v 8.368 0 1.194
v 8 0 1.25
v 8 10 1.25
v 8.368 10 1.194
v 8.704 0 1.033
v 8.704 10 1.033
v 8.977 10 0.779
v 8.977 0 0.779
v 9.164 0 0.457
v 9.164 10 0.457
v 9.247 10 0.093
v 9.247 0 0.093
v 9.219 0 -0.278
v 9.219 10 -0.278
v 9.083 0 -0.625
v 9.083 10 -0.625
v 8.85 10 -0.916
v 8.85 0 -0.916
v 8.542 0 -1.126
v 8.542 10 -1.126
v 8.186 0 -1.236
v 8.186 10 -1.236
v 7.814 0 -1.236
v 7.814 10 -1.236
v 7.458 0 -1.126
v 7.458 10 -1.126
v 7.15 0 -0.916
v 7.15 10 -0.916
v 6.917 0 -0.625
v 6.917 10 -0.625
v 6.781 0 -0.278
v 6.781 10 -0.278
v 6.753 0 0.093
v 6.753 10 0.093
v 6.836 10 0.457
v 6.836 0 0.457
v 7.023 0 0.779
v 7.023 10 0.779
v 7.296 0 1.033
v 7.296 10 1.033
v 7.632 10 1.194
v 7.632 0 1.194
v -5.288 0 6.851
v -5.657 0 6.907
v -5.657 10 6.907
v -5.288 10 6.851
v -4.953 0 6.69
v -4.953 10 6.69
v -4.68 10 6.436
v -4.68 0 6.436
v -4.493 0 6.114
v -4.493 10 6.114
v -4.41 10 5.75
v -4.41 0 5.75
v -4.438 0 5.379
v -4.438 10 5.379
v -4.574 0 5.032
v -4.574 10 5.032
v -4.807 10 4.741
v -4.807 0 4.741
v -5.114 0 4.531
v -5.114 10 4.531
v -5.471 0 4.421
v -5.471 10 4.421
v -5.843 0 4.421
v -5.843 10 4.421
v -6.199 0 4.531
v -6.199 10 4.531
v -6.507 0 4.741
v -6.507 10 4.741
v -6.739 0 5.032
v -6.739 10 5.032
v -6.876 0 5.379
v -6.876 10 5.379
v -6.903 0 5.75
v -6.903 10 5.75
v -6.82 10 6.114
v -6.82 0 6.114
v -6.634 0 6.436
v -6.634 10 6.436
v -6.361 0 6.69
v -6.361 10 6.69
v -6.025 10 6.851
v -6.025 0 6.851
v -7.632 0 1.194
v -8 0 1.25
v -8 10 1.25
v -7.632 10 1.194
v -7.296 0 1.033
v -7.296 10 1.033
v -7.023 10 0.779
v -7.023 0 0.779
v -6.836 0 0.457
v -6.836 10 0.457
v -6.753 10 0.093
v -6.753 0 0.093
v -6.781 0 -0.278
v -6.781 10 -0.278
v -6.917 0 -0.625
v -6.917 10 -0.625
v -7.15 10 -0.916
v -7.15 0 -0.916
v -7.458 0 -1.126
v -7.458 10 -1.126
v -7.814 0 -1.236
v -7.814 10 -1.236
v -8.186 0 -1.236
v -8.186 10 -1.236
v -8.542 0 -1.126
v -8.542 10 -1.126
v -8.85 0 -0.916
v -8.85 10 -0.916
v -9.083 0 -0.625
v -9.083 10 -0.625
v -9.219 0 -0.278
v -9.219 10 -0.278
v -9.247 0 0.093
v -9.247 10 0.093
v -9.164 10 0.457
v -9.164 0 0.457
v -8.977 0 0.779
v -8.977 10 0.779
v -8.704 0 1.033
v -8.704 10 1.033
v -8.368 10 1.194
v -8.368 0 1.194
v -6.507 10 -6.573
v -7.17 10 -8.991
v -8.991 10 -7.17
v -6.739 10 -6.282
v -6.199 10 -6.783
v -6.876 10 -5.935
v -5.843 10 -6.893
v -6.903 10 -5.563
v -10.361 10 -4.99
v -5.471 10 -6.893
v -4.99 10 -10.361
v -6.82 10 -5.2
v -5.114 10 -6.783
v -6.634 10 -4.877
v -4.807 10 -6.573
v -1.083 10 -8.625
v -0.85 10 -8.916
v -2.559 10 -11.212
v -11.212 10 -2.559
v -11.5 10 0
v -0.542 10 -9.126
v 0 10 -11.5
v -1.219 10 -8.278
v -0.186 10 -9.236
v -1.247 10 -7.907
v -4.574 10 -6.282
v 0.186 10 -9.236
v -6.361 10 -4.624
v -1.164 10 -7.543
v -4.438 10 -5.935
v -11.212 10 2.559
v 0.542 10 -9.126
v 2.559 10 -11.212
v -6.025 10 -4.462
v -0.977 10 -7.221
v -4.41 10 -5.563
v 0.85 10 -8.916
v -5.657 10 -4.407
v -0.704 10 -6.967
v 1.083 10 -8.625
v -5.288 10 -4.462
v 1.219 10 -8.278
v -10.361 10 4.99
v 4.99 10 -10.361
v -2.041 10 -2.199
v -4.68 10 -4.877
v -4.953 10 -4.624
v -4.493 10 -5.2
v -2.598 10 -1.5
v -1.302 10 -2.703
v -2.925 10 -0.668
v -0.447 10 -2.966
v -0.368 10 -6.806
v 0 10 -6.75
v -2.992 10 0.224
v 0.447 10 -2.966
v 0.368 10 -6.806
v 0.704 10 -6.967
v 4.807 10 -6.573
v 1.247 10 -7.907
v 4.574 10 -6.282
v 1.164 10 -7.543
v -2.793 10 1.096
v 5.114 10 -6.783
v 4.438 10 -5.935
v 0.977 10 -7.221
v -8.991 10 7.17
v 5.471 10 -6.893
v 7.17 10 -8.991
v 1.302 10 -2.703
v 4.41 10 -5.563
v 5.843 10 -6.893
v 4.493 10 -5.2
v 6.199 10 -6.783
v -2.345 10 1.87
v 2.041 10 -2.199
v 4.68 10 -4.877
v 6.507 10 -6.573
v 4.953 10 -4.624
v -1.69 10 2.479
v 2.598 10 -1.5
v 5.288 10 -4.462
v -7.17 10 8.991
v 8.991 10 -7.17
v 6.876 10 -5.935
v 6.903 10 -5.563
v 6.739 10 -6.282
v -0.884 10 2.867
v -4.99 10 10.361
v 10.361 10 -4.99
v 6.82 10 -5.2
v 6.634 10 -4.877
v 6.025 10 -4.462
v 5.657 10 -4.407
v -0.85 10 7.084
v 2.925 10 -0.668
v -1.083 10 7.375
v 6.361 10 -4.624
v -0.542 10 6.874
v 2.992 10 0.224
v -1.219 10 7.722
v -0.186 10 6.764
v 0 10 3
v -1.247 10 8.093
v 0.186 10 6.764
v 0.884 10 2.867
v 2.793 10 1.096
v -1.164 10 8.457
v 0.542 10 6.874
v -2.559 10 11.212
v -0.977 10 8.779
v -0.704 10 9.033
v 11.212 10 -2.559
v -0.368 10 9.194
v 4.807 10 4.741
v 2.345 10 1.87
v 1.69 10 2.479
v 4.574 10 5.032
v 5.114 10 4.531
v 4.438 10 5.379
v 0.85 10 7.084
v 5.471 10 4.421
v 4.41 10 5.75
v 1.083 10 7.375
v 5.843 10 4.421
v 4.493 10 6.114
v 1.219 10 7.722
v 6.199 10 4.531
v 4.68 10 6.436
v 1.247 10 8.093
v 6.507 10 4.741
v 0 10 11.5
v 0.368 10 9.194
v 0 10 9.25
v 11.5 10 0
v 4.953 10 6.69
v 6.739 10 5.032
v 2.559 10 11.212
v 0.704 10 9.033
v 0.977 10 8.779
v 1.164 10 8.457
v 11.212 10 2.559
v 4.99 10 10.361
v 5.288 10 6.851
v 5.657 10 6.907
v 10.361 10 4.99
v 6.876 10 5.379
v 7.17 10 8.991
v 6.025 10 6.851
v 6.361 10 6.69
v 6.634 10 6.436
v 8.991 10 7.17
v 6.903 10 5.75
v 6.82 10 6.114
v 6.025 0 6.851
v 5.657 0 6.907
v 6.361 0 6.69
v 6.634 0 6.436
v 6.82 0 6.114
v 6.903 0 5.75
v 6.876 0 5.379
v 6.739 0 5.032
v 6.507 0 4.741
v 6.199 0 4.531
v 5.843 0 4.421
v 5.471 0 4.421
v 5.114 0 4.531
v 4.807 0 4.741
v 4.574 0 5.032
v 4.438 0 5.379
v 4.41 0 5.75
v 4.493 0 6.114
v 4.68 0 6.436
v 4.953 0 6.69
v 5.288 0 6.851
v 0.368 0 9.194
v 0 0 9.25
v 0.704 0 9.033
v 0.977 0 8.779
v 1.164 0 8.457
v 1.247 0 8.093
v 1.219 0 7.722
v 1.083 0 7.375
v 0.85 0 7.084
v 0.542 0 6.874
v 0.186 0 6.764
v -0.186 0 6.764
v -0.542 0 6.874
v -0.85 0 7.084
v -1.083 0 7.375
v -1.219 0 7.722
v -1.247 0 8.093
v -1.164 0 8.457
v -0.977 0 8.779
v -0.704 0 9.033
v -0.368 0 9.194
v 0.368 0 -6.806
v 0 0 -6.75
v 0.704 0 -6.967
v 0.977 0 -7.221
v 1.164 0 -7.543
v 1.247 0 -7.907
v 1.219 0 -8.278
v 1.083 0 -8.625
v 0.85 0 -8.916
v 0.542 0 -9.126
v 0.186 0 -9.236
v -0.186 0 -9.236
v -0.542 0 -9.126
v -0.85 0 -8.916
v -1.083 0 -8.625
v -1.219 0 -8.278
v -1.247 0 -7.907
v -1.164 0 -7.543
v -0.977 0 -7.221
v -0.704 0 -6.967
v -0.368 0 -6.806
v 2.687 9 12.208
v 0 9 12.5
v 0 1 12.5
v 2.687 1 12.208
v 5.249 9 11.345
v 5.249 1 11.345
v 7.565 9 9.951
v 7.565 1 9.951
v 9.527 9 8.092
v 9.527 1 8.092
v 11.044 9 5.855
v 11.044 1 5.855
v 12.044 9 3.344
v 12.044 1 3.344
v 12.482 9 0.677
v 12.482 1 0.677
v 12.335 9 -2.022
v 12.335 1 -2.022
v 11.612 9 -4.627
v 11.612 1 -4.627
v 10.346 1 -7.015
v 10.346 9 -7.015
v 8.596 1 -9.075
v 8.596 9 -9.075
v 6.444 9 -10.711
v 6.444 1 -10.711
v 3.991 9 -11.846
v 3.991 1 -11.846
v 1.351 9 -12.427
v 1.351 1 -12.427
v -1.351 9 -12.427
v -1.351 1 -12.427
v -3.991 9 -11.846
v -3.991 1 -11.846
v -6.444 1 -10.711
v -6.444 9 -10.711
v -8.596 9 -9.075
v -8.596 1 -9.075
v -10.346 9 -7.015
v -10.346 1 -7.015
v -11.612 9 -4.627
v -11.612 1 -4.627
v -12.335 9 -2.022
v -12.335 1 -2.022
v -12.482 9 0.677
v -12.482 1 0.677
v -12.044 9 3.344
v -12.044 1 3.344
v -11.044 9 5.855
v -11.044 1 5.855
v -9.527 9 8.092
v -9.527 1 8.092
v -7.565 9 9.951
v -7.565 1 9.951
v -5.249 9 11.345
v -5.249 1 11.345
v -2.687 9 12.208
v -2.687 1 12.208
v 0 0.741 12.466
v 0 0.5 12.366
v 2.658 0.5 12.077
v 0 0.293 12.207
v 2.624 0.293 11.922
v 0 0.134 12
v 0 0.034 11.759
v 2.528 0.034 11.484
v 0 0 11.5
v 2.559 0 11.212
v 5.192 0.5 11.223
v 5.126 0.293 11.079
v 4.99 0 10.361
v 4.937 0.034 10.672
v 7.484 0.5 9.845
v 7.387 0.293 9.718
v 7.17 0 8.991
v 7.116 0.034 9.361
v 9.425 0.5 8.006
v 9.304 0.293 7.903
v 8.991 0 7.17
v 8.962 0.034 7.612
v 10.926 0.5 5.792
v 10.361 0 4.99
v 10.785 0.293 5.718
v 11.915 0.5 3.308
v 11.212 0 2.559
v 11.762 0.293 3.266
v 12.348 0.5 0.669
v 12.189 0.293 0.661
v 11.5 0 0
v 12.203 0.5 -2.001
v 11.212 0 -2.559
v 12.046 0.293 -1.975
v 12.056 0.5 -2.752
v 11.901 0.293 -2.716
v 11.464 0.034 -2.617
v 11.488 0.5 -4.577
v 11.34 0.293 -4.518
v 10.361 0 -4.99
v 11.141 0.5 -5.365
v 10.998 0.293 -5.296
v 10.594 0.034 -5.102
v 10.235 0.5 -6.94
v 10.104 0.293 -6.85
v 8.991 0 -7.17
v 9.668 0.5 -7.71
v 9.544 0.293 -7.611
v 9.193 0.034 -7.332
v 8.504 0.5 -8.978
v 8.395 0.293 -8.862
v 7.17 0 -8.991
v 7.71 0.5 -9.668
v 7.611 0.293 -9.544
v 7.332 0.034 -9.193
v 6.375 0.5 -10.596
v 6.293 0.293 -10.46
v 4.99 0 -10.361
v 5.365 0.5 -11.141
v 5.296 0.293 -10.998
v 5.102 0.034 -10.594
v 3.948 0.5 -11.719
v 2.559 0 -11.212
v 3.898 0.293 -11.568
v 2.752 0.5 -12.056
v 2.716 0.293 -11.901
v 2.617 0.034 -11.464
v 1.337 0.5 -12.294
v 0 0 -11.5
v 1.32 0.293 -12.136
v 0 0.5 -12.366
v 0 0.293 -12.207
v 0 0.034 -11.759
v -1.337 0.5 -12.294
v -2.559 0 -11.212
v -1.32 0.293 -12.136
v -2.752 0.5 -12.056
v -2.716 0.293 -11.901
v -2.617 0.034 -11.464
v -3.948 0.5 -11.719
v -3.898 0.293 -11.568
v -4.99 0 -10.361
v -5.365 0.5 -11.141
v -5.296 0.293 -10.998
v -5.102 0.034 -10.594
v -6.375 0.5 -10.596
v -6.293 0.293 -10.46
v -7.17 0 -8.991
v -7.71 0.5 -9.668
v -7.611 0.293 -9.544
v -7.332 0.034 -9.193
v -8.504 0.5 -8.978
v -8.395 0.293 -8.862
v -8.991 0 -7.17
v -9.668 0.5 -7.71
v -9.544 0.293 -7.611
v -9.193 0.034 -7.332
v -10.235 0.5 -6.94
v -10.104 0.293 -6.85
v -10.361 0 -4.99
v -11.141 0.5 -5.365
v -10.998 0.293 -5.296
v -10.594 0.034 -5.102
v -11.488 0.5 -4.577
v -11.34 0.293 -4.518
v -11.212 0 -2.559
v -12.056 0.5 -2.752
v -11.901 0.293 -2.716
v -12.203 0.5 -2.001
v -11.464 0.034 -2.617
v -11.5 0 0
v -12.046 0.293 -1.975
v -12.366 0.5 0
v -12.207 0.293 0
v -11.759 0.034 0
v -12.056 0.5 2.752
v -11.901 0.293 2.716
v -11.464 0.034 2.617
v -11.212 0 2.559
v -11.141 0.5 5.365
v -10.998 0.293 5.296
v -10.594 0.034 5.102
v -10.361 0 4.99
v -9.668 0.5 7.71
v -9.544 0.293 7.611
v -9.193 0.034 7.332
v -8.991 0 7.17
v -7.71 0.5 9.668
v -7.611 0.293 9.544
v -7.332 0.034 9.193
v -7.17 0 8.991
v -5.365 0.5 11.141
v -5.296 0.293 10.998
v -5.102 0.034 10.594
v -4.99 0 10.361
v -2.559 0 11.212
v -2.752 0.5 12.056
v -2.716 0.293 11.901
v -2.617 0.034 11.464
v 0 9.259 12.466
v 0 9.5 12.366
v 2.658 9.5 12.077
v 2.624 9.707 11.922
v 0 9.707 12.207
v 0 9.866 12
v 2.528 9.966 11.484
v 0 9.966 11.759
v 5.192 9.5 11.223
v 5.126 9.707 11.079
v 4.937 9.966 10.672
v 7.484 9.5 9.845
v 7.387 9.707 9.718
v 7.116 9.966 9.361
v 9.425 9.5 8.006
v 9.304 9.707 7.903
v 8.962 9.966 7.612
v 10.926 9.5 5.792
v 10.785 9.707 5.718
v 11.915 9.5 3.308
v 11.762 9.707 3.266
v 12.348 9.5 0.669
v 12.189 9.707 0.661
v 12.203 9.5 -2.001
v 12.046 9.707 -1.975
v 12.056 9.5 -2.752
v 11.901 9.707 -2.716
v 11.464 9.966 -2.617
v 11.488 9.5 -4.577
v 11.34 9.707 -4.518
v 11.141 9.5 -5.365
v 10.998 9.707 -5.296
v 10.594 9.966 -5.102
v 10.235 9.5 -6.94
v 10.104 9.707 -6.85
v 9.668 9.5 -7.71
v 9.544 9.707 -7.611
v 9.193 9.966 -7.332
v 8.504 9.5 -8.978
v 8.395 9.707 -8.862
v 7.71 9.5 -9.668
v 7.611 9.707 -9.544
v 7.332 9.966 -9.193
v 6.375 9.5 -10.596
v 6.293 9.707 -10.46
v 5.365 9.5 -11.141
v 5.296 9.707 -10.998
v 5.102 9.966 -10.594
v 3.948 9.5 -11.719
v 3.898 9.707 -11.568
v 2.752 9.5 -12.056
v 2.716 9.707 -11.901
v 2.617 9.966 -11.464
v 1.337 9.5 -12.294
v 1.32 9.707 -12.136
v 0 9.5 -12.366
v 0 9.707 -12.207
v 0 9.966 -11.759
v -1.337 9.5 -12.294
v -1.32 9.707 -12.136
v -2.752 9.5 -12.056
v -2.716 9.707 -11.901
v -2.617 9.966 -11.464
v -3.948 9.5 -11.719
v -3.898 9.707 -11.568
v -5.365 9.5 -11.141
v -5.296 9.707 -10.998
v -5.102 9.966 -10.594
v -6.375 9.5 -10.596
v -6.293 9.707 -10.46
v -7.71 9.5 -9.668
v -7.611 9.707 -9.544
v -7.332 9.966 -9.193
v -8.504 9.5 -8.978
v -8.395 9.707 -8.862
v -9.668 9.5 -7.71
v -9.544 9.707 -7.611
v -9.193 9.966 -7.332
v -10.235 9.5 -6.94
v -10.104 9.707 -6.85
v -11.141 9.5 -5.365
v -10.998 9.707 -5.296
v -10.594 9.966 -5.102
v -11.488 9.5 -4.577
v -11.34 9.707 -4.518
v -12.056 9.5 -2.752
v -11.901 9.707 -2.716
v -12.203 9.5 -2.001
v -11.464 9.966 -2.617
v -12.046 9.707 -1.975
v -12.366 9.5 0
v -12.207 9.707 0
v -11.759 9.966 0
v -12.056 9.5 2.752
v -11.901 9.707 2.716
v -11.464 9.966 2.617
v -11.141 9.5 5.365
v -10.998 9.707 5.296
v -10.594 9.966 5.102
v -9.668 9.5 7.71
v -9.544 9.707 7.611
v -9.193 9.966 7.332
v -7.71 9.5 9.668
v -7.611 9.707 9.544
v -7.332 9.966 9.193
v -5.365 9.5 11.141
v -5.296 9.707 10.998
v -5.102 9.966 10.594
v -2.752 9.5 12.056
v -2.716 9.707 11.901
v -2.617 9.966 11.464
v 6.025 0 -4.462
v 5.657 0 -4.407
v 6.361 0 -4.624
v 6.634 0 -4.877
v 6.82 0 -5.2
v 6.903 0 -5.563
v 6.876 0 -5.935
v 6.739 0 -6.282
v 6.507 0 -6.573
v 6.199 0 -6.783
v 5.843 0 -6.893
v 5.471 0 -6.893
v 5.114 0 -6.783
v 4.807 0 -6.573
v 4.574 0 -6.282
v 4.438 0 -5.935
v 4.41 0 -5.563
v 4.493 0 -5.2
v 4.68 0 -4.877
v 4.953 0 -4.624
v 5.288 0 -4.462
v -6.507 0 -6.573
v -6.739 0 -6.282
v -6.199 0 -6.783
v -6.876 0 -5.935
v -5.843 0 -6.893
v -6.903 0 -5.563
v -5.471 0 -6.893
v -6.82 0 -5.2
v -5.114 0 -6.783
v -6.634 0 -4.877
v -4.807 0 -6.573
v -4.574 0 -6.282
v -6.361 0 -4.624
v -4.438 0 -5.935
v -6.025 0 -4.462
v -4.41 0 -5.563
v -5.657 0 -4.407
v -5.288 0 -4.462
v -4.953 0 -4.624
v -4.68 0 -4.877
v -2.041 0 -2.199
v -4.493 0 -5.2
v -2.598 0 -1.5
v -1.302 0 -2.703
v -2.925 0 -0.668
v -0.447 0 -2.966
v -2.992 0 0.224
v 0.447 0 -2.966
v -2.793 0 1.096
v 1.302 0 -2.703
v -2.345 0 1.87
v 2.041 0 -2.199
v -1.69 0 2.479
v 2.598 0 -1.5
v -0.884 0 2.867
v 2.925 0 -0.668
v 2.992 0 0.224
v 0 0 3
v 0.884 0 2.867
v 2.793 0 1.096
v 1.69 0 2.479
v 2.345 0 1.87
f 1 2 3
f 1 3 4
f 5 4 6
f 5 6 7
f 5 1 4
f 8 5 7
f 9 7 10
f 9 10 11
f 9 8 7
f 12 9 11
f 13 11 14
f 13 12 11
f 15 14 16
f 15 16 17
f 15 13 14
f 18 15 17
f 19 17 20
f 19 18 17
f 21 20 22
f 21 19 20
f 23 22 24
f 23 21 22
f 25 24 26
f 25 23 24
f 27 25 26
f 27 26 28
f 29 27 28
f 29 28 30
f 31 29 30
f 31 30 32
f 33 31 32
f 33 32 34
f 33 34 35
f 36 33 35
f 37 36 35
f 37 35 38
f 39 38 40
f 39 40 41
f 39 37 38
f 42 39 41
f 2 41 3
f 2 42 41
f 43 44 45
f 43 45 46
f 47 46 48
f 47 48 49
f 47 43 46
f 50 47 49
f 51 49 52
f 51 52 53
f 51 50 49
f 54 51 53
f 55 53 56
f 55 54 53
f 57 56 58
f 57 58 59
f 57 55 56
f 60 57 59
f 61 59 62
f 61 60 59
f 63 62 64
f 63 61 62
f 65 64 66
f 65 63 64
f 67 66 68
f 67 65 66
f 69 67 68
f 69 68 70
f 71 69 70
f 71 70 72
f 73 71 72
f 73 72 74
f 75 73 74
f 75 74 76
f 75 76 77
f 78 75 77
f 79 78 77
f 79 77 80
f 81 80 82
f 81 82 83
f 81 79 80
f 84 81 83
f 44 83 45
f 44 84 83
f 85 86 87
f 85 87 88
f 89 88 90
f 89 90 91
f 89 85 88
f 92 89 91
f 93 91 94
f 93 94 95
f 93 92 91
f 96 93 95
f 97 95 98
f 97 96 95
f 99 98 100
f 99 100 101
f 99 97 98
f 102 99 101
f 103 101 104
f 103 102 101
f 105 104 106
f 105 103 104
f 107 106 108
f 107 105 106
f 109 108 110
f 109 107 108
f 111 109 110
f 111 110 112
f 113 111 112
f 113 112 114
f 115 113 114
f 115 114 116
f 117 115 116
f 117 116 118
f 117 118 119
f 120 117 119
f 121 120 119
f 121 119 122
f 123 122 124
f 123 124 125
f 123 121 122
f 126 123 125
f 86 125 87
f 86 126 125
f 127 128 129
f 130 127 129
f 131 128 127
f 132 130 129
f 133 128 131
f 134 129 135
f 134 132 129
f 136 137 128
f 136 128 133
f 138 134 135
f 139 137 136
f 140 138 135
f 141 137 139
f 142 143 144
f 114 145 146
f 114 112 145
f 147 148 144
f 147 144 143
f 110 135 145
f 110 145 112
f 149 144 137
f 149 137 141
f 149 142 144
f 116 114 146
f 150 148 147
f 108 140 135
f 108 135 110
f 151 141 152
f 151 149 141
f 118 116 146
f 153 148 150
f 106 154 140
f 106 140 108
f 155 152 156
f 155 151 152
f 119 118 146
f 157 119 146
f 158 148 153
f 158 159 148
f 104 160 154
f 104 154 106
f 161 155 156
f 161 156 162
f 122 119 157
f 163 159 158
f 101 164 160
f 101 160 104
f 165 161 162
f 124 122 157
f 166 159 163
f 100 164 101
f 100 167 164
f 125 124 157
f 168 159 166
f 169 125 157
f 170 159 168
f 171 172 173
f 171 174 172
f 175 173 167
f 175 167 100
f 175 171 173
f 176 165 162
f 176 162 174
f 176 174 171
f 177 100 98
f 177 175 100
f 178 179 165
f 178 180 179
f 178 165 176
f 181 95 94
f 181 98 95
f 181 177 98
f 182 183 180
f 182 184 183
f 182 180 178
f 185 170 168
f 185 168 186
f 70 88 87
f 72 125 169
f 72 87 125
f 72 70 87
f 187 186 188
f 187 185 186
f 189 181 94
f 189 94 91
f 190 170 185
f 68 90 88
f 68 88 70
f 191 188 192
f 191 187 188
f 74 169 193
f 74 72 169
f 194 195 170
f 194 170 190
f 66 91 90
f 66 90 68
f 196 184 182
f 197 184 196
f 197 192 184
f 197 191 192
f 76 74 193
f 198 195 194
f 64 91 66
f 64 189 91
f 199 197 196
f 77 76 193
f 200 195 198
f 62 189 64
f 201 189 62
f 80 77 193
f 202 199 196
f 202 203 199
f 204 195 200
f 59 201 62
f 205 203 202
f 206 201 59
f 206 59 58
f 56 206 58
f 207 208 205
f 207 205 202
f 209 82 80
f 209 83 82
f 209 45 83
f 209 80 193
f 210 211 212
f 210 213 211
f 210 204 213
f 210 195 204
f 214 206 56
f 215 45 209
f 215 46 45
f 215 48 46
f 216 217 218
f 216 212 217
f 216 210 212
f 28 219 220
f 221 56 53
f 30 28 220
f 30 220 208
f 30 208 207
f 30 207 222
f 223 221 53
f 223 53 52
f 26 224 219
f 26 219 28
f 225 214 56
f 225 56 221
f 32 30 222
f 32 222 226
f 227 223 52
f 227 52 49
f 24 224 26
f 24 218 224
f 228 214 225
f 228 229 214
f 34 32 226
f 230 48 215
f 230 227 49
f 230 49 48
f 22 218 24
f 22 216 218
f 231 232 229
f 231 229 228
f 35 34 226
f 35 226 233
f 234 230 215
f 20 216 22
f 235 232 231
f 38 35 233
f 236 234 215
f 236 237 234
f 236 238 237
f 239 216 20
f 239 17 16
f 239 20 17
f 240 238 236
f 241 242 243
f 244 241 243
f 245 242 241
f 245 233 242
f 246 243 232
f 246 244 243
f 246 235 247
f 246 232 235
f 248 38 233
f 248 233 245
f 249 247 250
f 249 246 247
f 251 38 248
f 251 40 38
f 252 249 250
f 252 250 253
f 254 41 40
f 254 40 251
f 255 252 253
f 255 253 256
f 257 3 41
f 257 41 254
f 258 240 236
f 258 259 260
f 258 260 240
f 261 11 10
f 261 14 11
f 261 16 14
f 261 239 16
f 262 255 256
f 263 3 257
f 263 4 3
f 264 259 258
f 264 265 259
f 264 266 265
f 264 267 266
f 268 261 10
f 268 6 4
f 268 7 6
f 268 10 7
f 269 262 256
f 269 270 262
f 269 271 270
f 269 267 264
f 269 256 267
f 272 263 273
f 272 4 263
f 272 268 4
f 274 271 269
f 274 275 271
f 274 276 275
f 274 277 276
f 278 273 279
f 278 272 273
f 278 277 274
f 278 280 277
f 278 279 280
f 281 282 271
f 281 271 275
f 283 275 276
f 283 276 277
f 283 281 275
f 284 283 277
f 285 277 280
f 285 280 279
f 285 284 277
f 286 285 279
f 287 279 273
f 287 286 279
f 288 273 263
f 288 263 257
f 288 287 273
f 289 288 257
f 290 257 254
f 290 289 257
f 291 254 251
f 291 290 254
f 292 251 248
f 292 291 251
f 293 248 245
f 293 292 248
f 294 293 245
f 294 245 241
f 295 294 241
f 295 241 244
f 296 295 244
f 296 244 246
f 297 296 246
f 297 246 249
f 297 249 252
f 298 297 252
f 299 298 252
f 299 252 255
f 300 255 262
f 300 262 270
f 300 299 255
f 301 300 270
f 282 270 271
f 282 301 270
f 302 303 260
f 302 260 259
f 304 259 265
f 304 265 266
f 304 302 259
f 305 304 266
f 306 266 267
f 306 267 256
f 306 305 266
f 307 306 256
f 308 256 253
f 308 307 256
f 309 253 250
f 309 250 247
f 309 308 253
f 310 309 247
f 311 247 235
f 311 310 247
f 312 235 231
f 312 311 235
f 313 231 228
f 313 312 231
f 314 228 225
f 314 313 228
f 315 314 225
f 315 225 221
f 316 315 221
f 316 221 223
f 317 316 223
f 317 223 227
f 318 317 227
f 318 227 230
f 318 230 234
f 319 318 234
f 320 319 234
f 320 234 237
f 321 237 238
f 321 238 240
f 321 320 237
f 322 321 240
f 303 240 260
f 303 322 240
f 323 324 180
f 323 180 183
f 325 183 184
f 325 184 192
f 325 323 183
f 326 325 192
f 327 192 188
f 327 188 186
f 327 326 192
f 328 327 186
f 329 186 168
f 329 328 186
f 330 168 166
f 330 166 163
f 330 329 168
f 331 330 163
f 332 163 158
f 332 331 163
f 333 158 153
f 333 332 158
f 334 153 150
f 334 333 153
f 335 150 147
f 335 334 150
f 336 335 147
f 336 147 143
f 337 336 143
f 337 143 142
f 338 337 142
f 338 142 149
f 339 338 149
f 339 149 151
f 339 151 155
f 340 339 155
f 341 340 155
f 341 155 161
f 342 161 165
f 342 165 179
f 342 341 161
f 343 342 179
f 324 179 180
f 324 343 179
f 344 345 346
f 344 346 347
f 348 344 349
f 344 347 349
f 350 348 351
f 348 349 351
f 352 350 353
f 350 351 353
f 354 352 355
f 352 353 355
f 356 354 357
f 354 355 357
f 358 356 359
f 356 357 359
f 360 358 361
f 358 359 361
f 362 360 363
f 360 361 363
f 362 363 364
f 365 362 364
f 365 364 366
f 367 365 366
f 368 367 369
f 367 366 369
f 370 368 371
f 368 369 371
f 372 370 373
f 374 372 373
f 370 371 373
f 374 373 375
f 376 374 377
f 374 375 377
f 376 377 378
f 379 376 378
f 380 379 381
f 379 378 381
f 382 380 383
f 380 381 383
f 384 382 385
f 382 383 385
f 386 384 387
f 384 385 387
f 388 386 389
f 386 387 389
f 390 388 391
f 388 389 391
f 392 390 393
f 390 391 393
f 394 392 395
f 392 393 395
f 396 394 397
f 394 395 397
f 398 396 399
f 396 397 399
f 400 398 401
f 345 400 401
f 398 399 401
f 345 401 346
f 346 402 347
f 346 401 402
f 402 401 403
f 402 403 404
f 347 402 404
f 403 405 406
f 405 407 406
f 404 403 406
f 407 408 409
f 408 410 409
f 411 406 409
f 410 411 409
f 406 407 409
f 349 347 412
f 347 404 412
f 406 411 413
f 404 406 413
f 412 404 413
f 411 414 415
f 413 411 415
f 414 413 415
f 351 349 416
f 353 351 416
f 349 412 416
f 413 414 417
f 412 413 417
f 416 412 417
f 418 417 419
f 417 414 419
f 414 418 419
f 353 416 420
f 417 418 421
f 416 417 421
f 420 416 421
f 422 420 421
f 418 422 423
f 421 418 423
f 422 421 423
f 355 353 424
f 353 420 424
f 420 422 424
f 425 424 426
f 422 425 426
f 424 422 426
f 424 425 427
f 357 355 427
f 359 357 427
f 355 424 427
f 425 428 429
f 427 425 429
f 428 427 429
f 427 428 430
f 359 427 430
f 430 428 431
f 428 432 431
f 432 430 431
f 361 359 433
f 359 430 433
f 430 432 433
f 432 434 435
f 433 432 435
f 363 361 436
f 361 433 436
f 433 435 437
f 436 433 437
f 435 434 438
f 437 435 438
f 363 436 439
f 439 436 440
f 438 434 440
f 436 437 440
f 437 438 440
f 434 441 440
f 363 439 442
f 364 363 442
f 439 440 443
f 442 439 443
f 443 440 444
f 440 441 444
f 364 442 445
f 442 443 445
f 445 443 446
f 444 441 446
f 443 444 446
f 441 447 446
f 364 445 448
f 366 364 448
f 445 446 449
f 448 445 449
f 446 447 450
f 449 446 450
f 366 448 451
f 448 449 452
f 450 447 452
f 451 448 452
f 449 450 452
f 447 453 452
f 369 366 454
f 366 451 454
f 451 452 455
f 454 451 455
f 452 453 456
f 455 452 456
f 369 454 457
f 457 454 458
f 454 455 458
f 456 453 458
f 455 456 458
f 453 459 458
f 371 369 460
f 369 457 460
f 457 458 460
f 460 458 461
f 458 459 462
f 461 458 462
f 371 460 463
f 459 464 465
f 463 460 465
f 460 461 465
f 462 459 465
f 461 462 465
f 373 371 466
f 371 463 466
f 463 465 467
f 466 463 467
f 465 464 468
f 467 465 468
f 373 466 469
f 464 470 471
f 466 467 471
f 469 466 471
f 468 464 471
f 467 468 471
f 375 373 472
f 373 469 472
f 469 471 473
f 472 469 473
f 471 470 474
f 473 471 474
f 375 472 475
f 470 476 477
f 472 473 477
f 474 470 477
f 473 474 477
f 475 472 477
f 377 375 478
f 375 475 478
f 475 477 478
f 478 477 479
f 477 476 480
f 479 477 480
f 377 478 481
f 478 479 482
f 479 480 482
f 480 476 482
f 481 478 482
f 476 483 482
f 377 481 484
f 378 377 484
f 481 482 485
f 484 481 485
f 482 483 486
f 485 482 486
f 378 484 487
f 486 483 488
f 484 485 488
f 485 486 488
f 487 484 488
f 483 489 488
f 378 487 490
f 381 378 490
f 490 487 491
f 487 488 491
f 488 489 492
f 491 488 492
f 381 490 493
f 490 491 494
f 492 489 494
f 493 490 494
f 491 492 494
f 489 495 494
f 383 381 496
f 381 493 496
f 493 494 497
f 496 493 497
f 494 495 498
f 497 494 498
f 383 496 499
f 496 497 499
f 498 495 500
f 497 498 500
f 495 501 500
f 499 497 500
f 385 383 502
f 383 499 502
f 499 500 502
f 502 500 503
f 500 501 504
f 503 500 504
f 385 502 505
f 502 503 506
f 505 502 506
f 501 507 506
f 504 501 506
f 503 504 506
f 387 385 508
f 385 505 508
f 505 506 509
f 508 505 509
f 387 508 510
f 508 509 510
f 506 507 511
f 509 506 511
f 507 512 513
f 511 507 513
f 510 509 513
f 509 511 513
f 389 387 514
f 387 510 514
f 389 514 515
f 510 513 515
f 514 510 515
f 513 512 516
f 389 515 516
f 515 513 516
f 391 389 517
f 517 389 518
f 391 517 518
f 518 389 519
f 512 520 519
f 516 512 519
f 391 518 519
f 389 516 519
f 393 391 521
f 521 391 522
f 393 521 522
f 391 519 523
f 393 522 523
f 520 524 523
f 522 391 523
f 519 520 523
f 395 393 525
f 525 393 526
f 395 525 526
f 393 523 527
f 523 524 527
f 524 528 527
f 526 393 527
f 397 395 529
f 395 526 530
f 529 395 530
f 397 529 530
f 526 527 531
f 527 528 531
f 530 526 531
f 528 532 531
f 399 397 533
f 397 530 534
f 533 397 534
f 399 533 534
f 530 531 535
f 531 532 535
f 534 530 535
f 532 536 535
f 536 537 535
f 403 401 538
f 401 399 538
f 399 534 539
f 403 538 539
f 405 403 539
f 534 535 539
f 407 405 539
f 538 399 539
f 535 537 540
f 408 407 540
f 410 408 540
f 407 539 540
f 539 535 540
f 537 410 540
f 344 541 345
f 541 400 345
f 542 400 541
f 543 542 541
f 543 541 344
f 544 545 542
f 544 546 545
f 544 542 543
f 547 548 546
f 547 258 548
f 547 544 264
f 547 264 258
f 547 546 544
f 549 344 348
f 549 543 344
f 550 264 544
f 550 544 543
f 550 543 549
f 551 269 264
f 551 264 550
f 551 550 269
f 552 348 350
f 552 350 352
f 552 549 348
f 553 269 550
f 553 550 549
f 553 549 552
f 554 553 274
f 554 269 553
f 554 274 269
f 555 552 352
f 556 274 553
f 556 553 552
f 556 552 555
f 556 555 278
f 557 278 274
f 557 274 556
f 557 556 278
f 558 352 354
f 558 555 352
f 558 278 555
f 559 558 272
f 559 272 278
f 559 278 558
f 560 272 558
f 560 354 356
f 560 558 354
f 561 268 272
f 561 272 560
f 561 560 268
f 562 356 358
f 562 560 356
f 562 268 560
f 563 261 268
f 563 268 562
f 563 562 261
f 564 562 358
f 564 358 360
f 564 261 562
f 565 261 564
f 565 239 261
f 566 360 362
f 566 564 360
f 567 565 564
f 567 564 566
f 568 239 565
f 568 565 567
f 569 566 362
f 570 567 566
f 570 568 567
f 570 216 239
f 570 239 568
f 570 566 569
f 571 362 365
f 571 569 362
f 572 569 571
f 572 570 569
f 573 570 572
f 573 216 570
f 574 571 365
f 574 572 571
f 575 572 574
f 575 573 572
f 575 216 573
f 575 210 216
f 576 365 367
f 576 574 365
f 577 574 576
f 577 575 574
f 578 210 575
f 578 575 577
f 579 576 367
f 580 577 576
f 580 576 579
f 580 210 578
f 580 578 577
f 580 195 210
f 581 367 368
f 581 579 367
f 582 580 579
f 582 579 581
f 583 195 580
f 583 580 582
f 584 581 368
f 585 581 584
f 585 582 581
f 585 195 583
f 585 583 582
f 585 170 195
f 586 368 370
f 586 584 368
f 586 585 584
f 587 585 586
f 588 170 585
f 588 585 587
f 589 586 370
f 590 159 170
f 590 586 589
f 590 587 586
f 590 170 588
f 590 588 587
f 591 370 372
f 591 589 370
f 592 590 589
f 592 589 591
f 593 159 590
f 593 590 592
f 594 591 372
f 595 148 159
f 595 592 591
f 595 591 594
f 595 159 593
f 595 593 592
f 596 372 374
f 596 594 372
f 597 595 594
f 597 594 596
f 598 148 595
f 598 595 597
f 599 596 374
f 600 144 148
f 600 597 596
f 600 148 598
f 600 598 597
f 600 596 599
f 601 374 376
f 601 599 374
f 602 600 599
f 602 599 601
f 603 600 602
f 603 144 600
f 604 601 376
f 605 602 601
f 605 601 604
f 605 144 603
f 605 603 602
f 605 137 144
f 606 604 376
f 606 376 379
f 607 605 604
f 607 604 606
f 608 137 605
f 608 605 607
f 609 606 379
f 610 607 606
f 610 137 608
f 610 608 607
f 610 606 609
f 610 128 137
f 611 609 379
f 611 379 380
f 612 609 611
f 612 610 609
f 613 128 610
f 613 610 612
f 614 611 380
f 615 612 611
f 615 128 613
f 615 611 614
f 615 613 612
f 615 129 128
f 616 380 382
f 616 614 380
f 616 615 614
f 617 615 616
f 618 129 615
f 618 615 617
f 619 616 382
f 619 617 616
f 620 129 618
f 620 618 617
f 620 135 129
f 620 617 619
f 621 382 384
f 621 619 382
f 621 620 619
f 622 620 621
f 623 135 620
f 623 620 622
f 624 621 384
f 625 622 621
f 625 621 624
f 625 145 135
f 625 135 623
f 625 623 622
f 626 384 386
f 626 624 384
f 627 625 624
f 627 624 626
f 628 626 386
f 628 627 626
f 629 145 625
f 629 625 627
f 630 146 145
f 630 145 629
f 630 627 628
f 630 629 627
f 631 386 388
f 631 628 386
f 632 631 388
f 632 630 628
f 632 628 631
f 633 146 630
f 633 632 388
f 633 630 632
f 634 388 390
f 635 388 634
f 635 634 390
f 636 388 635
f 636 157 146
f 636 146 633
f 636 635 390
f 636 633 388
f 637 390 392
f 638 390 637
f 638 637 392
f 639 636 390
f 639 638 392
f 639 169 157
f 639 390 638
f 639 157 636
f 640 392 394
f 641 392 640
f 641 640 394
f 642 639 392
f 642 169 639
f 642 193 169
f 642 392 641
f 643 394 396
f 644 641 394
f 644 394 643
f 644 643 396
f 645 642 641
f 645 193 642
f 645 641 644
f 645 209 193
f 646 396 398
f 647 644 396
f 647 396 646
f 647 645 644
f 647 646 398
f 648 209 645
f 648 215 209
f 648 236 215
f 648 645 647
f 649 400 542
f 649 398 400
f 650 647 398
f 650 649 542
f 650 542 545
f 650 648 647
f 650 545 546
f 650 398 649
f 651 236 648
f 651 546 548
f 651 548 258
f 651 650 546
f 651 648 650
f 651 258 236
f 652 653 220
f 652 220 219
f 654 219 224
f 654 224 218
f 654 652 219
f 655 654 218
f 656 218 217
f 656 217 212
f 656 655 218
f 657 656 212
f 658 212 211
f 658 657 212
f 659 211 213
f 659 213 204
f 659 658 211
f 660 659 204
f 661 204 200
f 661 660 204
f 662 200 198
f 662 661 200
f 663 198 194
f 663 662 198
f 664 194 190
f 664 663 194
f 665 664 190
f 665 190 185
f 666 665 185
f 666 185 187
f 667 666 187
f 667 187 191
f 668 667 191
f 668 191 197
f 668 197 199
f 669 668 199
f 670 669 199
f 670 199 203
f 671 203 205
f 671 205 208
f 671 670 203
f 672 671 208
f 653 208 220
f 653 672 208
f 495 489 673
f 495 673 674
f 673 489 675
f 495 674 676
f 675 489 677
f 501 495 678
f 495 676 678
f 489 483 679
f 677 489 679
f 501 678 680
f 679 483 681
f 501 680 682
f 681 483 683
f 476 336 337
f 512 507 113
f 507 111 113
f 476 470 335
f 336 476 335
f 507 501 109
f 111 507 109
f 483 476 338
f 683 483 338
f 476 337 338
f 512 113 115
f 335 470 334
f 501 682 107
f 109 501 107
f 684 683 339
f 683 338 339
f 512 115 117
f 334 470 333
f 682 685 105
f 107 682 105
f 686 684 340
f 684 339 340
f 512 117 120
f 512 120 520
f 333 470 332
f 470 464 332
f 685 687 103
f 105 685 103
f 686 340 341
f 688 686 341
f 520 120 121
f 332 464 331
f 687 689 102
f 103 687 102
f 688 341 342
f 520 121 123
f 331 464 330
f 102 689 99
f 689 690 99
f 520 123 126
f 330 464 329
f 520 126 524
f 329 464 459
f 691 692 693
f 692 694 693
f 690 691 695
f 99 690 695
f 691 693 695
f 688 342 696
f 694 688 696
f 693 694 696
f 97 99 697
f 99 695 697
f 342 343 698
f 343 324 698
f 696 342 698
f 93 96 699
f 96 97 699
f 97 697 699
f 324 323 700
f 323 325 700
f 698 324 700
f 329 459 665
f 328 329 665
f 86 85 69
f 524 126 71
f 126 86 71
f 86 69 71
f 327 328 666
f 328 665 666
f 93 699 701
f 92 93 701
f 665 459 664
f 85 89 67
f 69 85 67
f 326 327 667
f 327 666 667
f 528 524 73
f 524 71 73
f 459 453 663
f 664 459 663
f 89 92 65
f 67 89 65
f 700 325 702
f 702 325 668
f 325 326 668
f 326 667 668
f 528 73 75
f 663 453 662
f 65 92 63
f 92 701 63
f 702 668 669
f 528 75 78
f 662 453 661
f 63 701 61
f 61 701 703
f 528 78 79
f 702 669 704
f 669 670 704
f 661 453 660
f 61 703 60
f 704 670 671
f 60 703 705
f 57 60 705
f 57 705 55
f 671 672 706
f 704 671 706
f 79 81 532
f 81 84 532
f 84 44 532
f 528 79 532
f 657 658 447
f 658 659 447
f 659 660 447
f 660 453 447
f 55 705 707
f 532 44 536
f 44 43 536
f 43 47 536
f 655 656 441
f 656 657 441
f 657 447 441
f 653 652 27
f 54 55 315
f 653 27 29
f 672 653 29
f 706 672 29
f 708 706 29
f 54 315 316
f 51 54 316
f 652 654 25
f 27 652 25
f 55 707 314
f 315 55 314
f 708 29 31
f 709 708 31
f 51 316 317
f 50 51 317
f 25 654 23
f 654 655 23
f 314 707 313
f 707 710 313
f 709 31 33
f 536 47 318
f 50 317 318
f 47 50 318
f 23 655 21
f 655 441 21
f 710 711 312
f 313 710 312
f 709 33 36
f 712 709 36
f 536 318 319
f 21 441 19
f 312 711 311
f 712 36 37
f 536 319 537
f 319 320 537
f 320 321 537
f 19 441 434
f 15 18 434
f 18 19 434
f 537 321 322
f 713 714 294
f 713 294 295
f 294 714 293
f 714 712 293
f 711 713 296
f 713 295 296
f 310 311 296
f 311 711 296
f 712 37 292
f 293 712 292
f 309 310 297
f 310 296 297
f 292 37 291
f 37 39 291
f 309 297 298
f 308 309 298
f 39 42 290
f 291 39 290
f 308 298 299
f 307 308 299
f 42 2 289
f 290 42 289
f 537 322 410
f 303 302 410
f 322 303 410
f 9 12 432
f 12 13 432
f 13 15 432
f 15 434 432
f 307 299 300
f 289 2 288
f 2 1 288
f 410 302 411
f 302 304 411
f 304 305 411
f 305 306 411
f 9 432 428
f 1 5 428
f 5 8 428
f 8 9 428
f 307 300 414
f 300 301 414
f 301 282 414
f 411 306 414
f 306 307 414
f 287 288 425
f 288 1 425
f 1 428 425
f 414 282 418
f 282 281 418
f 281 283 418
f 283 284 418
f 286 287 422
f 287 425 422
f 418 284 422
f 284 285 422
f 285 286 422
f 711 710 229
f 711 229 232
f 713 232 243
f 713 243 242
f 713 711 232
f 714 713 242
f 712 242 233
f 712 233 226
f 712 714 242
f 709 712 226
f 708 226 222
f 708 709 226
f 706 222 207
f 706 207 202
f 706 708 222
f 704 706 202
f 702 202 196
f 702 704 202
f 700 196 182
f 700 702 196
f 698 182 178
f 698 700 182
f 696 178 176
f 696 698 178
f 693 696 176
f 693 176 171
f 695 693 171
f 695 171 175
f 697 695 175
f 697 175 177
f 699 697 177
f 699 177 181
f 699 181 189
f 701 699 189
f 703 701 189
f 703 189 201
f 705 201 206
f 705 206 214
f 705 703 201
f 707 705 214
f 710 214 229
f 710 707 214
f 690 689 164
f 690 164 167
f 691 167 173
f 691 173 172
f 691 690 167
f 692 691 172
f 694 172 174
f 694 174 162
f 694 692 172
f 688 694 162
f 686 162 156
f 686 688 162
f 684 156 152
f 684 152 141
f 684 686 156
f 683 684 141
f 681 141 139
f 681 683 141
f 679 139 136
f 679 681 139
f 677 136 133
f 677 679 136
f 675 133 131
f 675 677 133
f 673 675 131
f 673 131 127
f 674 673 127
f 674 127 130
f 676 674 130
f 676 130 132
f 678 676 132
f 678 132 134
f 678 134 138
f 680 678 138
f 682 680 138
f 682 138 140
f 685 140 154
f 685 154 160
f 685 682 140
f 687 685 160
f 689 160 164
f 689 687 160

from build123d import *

# Parameters (mm, degrees)
SKETCH1_R           = 12.5
SKETCH1_R_2         = 1.25
SKETCH1_R_3         = 3
BOSS_EXTRUDE1_DEPTH = 10
FILLET1_R           = 1


with BuildPart() as part:
    # Sketch1 → Boss-Extrude1 (new body)
    with BuildSketch(Plane(origin=(0, 0, 0), x_dir=(1, 0, 0), z_dir=(0, 1, 0))):
        with Locations(Location((0, 0, 0), (0, 0, 270))):
            Circle(SKETCH1_R)
        with Locations(Location((0, 8, 0), (0, 0, 270))):
            Circle(SKETCH1_R_2, mode=Mode.SUBTRACT)
        with Locations(Location((5.656854249, 5.656854249, 0), (0, 0, 270))):
            Circle(SKETCH1_R_2, mode=Mode.SUBTRACT)
        with Locations(Location((0, 0, 0), (0, 0, 270))):
            Circle(SKETCH1_R_3, mode=Mode.SUBTRACT)
        with Locations(Location((8, 0, 0), (0, 0, 270))):
            Circle(SKETCH1_R_2, mode=Mode.SUBTRACT)
        with Locations(Location((5.656854249, -5.656854249, 0), (0, 0, 270))):
            Circle(SKETCH1_R_2, mode=Mode.SUBTRACT)
        with Locations(Location((0, -8, 0), (0, 0, 270))):
            Circle(SKETCH1_R_2, mode=Mode.SUBTRACT)
        with Locations(Location((-5.656854249, -5.656854249, 0), (0, 0, 270))):
            Circle(SKETCH1_R_2, mode=Mode.SUBTRACT)
        with Locations(Location((-8, 0, 0), (0, 0, 270))):
            Circle(SKETCH1_R_2, mode=Mode.SUBTRACT)
        with Locations(Location((-5.656854249, 5.656854249, 0), (0, 0, 270))):
            Circle(SKETCH1_R_2, mode=Mode.SUBTRACT)
    extrude(amount=BOSS_EXTRUDE1_DEPTH)

    # Fillet1
    fillet1_edges = [part.edges().sort_by_distance(p)[0] for p in [
        (0, 0, -12.5),
        (0, 10, -12.5),
    ]]
    fillet(fillet1_edges, radius=FILLET1_R)


solid = part.part
